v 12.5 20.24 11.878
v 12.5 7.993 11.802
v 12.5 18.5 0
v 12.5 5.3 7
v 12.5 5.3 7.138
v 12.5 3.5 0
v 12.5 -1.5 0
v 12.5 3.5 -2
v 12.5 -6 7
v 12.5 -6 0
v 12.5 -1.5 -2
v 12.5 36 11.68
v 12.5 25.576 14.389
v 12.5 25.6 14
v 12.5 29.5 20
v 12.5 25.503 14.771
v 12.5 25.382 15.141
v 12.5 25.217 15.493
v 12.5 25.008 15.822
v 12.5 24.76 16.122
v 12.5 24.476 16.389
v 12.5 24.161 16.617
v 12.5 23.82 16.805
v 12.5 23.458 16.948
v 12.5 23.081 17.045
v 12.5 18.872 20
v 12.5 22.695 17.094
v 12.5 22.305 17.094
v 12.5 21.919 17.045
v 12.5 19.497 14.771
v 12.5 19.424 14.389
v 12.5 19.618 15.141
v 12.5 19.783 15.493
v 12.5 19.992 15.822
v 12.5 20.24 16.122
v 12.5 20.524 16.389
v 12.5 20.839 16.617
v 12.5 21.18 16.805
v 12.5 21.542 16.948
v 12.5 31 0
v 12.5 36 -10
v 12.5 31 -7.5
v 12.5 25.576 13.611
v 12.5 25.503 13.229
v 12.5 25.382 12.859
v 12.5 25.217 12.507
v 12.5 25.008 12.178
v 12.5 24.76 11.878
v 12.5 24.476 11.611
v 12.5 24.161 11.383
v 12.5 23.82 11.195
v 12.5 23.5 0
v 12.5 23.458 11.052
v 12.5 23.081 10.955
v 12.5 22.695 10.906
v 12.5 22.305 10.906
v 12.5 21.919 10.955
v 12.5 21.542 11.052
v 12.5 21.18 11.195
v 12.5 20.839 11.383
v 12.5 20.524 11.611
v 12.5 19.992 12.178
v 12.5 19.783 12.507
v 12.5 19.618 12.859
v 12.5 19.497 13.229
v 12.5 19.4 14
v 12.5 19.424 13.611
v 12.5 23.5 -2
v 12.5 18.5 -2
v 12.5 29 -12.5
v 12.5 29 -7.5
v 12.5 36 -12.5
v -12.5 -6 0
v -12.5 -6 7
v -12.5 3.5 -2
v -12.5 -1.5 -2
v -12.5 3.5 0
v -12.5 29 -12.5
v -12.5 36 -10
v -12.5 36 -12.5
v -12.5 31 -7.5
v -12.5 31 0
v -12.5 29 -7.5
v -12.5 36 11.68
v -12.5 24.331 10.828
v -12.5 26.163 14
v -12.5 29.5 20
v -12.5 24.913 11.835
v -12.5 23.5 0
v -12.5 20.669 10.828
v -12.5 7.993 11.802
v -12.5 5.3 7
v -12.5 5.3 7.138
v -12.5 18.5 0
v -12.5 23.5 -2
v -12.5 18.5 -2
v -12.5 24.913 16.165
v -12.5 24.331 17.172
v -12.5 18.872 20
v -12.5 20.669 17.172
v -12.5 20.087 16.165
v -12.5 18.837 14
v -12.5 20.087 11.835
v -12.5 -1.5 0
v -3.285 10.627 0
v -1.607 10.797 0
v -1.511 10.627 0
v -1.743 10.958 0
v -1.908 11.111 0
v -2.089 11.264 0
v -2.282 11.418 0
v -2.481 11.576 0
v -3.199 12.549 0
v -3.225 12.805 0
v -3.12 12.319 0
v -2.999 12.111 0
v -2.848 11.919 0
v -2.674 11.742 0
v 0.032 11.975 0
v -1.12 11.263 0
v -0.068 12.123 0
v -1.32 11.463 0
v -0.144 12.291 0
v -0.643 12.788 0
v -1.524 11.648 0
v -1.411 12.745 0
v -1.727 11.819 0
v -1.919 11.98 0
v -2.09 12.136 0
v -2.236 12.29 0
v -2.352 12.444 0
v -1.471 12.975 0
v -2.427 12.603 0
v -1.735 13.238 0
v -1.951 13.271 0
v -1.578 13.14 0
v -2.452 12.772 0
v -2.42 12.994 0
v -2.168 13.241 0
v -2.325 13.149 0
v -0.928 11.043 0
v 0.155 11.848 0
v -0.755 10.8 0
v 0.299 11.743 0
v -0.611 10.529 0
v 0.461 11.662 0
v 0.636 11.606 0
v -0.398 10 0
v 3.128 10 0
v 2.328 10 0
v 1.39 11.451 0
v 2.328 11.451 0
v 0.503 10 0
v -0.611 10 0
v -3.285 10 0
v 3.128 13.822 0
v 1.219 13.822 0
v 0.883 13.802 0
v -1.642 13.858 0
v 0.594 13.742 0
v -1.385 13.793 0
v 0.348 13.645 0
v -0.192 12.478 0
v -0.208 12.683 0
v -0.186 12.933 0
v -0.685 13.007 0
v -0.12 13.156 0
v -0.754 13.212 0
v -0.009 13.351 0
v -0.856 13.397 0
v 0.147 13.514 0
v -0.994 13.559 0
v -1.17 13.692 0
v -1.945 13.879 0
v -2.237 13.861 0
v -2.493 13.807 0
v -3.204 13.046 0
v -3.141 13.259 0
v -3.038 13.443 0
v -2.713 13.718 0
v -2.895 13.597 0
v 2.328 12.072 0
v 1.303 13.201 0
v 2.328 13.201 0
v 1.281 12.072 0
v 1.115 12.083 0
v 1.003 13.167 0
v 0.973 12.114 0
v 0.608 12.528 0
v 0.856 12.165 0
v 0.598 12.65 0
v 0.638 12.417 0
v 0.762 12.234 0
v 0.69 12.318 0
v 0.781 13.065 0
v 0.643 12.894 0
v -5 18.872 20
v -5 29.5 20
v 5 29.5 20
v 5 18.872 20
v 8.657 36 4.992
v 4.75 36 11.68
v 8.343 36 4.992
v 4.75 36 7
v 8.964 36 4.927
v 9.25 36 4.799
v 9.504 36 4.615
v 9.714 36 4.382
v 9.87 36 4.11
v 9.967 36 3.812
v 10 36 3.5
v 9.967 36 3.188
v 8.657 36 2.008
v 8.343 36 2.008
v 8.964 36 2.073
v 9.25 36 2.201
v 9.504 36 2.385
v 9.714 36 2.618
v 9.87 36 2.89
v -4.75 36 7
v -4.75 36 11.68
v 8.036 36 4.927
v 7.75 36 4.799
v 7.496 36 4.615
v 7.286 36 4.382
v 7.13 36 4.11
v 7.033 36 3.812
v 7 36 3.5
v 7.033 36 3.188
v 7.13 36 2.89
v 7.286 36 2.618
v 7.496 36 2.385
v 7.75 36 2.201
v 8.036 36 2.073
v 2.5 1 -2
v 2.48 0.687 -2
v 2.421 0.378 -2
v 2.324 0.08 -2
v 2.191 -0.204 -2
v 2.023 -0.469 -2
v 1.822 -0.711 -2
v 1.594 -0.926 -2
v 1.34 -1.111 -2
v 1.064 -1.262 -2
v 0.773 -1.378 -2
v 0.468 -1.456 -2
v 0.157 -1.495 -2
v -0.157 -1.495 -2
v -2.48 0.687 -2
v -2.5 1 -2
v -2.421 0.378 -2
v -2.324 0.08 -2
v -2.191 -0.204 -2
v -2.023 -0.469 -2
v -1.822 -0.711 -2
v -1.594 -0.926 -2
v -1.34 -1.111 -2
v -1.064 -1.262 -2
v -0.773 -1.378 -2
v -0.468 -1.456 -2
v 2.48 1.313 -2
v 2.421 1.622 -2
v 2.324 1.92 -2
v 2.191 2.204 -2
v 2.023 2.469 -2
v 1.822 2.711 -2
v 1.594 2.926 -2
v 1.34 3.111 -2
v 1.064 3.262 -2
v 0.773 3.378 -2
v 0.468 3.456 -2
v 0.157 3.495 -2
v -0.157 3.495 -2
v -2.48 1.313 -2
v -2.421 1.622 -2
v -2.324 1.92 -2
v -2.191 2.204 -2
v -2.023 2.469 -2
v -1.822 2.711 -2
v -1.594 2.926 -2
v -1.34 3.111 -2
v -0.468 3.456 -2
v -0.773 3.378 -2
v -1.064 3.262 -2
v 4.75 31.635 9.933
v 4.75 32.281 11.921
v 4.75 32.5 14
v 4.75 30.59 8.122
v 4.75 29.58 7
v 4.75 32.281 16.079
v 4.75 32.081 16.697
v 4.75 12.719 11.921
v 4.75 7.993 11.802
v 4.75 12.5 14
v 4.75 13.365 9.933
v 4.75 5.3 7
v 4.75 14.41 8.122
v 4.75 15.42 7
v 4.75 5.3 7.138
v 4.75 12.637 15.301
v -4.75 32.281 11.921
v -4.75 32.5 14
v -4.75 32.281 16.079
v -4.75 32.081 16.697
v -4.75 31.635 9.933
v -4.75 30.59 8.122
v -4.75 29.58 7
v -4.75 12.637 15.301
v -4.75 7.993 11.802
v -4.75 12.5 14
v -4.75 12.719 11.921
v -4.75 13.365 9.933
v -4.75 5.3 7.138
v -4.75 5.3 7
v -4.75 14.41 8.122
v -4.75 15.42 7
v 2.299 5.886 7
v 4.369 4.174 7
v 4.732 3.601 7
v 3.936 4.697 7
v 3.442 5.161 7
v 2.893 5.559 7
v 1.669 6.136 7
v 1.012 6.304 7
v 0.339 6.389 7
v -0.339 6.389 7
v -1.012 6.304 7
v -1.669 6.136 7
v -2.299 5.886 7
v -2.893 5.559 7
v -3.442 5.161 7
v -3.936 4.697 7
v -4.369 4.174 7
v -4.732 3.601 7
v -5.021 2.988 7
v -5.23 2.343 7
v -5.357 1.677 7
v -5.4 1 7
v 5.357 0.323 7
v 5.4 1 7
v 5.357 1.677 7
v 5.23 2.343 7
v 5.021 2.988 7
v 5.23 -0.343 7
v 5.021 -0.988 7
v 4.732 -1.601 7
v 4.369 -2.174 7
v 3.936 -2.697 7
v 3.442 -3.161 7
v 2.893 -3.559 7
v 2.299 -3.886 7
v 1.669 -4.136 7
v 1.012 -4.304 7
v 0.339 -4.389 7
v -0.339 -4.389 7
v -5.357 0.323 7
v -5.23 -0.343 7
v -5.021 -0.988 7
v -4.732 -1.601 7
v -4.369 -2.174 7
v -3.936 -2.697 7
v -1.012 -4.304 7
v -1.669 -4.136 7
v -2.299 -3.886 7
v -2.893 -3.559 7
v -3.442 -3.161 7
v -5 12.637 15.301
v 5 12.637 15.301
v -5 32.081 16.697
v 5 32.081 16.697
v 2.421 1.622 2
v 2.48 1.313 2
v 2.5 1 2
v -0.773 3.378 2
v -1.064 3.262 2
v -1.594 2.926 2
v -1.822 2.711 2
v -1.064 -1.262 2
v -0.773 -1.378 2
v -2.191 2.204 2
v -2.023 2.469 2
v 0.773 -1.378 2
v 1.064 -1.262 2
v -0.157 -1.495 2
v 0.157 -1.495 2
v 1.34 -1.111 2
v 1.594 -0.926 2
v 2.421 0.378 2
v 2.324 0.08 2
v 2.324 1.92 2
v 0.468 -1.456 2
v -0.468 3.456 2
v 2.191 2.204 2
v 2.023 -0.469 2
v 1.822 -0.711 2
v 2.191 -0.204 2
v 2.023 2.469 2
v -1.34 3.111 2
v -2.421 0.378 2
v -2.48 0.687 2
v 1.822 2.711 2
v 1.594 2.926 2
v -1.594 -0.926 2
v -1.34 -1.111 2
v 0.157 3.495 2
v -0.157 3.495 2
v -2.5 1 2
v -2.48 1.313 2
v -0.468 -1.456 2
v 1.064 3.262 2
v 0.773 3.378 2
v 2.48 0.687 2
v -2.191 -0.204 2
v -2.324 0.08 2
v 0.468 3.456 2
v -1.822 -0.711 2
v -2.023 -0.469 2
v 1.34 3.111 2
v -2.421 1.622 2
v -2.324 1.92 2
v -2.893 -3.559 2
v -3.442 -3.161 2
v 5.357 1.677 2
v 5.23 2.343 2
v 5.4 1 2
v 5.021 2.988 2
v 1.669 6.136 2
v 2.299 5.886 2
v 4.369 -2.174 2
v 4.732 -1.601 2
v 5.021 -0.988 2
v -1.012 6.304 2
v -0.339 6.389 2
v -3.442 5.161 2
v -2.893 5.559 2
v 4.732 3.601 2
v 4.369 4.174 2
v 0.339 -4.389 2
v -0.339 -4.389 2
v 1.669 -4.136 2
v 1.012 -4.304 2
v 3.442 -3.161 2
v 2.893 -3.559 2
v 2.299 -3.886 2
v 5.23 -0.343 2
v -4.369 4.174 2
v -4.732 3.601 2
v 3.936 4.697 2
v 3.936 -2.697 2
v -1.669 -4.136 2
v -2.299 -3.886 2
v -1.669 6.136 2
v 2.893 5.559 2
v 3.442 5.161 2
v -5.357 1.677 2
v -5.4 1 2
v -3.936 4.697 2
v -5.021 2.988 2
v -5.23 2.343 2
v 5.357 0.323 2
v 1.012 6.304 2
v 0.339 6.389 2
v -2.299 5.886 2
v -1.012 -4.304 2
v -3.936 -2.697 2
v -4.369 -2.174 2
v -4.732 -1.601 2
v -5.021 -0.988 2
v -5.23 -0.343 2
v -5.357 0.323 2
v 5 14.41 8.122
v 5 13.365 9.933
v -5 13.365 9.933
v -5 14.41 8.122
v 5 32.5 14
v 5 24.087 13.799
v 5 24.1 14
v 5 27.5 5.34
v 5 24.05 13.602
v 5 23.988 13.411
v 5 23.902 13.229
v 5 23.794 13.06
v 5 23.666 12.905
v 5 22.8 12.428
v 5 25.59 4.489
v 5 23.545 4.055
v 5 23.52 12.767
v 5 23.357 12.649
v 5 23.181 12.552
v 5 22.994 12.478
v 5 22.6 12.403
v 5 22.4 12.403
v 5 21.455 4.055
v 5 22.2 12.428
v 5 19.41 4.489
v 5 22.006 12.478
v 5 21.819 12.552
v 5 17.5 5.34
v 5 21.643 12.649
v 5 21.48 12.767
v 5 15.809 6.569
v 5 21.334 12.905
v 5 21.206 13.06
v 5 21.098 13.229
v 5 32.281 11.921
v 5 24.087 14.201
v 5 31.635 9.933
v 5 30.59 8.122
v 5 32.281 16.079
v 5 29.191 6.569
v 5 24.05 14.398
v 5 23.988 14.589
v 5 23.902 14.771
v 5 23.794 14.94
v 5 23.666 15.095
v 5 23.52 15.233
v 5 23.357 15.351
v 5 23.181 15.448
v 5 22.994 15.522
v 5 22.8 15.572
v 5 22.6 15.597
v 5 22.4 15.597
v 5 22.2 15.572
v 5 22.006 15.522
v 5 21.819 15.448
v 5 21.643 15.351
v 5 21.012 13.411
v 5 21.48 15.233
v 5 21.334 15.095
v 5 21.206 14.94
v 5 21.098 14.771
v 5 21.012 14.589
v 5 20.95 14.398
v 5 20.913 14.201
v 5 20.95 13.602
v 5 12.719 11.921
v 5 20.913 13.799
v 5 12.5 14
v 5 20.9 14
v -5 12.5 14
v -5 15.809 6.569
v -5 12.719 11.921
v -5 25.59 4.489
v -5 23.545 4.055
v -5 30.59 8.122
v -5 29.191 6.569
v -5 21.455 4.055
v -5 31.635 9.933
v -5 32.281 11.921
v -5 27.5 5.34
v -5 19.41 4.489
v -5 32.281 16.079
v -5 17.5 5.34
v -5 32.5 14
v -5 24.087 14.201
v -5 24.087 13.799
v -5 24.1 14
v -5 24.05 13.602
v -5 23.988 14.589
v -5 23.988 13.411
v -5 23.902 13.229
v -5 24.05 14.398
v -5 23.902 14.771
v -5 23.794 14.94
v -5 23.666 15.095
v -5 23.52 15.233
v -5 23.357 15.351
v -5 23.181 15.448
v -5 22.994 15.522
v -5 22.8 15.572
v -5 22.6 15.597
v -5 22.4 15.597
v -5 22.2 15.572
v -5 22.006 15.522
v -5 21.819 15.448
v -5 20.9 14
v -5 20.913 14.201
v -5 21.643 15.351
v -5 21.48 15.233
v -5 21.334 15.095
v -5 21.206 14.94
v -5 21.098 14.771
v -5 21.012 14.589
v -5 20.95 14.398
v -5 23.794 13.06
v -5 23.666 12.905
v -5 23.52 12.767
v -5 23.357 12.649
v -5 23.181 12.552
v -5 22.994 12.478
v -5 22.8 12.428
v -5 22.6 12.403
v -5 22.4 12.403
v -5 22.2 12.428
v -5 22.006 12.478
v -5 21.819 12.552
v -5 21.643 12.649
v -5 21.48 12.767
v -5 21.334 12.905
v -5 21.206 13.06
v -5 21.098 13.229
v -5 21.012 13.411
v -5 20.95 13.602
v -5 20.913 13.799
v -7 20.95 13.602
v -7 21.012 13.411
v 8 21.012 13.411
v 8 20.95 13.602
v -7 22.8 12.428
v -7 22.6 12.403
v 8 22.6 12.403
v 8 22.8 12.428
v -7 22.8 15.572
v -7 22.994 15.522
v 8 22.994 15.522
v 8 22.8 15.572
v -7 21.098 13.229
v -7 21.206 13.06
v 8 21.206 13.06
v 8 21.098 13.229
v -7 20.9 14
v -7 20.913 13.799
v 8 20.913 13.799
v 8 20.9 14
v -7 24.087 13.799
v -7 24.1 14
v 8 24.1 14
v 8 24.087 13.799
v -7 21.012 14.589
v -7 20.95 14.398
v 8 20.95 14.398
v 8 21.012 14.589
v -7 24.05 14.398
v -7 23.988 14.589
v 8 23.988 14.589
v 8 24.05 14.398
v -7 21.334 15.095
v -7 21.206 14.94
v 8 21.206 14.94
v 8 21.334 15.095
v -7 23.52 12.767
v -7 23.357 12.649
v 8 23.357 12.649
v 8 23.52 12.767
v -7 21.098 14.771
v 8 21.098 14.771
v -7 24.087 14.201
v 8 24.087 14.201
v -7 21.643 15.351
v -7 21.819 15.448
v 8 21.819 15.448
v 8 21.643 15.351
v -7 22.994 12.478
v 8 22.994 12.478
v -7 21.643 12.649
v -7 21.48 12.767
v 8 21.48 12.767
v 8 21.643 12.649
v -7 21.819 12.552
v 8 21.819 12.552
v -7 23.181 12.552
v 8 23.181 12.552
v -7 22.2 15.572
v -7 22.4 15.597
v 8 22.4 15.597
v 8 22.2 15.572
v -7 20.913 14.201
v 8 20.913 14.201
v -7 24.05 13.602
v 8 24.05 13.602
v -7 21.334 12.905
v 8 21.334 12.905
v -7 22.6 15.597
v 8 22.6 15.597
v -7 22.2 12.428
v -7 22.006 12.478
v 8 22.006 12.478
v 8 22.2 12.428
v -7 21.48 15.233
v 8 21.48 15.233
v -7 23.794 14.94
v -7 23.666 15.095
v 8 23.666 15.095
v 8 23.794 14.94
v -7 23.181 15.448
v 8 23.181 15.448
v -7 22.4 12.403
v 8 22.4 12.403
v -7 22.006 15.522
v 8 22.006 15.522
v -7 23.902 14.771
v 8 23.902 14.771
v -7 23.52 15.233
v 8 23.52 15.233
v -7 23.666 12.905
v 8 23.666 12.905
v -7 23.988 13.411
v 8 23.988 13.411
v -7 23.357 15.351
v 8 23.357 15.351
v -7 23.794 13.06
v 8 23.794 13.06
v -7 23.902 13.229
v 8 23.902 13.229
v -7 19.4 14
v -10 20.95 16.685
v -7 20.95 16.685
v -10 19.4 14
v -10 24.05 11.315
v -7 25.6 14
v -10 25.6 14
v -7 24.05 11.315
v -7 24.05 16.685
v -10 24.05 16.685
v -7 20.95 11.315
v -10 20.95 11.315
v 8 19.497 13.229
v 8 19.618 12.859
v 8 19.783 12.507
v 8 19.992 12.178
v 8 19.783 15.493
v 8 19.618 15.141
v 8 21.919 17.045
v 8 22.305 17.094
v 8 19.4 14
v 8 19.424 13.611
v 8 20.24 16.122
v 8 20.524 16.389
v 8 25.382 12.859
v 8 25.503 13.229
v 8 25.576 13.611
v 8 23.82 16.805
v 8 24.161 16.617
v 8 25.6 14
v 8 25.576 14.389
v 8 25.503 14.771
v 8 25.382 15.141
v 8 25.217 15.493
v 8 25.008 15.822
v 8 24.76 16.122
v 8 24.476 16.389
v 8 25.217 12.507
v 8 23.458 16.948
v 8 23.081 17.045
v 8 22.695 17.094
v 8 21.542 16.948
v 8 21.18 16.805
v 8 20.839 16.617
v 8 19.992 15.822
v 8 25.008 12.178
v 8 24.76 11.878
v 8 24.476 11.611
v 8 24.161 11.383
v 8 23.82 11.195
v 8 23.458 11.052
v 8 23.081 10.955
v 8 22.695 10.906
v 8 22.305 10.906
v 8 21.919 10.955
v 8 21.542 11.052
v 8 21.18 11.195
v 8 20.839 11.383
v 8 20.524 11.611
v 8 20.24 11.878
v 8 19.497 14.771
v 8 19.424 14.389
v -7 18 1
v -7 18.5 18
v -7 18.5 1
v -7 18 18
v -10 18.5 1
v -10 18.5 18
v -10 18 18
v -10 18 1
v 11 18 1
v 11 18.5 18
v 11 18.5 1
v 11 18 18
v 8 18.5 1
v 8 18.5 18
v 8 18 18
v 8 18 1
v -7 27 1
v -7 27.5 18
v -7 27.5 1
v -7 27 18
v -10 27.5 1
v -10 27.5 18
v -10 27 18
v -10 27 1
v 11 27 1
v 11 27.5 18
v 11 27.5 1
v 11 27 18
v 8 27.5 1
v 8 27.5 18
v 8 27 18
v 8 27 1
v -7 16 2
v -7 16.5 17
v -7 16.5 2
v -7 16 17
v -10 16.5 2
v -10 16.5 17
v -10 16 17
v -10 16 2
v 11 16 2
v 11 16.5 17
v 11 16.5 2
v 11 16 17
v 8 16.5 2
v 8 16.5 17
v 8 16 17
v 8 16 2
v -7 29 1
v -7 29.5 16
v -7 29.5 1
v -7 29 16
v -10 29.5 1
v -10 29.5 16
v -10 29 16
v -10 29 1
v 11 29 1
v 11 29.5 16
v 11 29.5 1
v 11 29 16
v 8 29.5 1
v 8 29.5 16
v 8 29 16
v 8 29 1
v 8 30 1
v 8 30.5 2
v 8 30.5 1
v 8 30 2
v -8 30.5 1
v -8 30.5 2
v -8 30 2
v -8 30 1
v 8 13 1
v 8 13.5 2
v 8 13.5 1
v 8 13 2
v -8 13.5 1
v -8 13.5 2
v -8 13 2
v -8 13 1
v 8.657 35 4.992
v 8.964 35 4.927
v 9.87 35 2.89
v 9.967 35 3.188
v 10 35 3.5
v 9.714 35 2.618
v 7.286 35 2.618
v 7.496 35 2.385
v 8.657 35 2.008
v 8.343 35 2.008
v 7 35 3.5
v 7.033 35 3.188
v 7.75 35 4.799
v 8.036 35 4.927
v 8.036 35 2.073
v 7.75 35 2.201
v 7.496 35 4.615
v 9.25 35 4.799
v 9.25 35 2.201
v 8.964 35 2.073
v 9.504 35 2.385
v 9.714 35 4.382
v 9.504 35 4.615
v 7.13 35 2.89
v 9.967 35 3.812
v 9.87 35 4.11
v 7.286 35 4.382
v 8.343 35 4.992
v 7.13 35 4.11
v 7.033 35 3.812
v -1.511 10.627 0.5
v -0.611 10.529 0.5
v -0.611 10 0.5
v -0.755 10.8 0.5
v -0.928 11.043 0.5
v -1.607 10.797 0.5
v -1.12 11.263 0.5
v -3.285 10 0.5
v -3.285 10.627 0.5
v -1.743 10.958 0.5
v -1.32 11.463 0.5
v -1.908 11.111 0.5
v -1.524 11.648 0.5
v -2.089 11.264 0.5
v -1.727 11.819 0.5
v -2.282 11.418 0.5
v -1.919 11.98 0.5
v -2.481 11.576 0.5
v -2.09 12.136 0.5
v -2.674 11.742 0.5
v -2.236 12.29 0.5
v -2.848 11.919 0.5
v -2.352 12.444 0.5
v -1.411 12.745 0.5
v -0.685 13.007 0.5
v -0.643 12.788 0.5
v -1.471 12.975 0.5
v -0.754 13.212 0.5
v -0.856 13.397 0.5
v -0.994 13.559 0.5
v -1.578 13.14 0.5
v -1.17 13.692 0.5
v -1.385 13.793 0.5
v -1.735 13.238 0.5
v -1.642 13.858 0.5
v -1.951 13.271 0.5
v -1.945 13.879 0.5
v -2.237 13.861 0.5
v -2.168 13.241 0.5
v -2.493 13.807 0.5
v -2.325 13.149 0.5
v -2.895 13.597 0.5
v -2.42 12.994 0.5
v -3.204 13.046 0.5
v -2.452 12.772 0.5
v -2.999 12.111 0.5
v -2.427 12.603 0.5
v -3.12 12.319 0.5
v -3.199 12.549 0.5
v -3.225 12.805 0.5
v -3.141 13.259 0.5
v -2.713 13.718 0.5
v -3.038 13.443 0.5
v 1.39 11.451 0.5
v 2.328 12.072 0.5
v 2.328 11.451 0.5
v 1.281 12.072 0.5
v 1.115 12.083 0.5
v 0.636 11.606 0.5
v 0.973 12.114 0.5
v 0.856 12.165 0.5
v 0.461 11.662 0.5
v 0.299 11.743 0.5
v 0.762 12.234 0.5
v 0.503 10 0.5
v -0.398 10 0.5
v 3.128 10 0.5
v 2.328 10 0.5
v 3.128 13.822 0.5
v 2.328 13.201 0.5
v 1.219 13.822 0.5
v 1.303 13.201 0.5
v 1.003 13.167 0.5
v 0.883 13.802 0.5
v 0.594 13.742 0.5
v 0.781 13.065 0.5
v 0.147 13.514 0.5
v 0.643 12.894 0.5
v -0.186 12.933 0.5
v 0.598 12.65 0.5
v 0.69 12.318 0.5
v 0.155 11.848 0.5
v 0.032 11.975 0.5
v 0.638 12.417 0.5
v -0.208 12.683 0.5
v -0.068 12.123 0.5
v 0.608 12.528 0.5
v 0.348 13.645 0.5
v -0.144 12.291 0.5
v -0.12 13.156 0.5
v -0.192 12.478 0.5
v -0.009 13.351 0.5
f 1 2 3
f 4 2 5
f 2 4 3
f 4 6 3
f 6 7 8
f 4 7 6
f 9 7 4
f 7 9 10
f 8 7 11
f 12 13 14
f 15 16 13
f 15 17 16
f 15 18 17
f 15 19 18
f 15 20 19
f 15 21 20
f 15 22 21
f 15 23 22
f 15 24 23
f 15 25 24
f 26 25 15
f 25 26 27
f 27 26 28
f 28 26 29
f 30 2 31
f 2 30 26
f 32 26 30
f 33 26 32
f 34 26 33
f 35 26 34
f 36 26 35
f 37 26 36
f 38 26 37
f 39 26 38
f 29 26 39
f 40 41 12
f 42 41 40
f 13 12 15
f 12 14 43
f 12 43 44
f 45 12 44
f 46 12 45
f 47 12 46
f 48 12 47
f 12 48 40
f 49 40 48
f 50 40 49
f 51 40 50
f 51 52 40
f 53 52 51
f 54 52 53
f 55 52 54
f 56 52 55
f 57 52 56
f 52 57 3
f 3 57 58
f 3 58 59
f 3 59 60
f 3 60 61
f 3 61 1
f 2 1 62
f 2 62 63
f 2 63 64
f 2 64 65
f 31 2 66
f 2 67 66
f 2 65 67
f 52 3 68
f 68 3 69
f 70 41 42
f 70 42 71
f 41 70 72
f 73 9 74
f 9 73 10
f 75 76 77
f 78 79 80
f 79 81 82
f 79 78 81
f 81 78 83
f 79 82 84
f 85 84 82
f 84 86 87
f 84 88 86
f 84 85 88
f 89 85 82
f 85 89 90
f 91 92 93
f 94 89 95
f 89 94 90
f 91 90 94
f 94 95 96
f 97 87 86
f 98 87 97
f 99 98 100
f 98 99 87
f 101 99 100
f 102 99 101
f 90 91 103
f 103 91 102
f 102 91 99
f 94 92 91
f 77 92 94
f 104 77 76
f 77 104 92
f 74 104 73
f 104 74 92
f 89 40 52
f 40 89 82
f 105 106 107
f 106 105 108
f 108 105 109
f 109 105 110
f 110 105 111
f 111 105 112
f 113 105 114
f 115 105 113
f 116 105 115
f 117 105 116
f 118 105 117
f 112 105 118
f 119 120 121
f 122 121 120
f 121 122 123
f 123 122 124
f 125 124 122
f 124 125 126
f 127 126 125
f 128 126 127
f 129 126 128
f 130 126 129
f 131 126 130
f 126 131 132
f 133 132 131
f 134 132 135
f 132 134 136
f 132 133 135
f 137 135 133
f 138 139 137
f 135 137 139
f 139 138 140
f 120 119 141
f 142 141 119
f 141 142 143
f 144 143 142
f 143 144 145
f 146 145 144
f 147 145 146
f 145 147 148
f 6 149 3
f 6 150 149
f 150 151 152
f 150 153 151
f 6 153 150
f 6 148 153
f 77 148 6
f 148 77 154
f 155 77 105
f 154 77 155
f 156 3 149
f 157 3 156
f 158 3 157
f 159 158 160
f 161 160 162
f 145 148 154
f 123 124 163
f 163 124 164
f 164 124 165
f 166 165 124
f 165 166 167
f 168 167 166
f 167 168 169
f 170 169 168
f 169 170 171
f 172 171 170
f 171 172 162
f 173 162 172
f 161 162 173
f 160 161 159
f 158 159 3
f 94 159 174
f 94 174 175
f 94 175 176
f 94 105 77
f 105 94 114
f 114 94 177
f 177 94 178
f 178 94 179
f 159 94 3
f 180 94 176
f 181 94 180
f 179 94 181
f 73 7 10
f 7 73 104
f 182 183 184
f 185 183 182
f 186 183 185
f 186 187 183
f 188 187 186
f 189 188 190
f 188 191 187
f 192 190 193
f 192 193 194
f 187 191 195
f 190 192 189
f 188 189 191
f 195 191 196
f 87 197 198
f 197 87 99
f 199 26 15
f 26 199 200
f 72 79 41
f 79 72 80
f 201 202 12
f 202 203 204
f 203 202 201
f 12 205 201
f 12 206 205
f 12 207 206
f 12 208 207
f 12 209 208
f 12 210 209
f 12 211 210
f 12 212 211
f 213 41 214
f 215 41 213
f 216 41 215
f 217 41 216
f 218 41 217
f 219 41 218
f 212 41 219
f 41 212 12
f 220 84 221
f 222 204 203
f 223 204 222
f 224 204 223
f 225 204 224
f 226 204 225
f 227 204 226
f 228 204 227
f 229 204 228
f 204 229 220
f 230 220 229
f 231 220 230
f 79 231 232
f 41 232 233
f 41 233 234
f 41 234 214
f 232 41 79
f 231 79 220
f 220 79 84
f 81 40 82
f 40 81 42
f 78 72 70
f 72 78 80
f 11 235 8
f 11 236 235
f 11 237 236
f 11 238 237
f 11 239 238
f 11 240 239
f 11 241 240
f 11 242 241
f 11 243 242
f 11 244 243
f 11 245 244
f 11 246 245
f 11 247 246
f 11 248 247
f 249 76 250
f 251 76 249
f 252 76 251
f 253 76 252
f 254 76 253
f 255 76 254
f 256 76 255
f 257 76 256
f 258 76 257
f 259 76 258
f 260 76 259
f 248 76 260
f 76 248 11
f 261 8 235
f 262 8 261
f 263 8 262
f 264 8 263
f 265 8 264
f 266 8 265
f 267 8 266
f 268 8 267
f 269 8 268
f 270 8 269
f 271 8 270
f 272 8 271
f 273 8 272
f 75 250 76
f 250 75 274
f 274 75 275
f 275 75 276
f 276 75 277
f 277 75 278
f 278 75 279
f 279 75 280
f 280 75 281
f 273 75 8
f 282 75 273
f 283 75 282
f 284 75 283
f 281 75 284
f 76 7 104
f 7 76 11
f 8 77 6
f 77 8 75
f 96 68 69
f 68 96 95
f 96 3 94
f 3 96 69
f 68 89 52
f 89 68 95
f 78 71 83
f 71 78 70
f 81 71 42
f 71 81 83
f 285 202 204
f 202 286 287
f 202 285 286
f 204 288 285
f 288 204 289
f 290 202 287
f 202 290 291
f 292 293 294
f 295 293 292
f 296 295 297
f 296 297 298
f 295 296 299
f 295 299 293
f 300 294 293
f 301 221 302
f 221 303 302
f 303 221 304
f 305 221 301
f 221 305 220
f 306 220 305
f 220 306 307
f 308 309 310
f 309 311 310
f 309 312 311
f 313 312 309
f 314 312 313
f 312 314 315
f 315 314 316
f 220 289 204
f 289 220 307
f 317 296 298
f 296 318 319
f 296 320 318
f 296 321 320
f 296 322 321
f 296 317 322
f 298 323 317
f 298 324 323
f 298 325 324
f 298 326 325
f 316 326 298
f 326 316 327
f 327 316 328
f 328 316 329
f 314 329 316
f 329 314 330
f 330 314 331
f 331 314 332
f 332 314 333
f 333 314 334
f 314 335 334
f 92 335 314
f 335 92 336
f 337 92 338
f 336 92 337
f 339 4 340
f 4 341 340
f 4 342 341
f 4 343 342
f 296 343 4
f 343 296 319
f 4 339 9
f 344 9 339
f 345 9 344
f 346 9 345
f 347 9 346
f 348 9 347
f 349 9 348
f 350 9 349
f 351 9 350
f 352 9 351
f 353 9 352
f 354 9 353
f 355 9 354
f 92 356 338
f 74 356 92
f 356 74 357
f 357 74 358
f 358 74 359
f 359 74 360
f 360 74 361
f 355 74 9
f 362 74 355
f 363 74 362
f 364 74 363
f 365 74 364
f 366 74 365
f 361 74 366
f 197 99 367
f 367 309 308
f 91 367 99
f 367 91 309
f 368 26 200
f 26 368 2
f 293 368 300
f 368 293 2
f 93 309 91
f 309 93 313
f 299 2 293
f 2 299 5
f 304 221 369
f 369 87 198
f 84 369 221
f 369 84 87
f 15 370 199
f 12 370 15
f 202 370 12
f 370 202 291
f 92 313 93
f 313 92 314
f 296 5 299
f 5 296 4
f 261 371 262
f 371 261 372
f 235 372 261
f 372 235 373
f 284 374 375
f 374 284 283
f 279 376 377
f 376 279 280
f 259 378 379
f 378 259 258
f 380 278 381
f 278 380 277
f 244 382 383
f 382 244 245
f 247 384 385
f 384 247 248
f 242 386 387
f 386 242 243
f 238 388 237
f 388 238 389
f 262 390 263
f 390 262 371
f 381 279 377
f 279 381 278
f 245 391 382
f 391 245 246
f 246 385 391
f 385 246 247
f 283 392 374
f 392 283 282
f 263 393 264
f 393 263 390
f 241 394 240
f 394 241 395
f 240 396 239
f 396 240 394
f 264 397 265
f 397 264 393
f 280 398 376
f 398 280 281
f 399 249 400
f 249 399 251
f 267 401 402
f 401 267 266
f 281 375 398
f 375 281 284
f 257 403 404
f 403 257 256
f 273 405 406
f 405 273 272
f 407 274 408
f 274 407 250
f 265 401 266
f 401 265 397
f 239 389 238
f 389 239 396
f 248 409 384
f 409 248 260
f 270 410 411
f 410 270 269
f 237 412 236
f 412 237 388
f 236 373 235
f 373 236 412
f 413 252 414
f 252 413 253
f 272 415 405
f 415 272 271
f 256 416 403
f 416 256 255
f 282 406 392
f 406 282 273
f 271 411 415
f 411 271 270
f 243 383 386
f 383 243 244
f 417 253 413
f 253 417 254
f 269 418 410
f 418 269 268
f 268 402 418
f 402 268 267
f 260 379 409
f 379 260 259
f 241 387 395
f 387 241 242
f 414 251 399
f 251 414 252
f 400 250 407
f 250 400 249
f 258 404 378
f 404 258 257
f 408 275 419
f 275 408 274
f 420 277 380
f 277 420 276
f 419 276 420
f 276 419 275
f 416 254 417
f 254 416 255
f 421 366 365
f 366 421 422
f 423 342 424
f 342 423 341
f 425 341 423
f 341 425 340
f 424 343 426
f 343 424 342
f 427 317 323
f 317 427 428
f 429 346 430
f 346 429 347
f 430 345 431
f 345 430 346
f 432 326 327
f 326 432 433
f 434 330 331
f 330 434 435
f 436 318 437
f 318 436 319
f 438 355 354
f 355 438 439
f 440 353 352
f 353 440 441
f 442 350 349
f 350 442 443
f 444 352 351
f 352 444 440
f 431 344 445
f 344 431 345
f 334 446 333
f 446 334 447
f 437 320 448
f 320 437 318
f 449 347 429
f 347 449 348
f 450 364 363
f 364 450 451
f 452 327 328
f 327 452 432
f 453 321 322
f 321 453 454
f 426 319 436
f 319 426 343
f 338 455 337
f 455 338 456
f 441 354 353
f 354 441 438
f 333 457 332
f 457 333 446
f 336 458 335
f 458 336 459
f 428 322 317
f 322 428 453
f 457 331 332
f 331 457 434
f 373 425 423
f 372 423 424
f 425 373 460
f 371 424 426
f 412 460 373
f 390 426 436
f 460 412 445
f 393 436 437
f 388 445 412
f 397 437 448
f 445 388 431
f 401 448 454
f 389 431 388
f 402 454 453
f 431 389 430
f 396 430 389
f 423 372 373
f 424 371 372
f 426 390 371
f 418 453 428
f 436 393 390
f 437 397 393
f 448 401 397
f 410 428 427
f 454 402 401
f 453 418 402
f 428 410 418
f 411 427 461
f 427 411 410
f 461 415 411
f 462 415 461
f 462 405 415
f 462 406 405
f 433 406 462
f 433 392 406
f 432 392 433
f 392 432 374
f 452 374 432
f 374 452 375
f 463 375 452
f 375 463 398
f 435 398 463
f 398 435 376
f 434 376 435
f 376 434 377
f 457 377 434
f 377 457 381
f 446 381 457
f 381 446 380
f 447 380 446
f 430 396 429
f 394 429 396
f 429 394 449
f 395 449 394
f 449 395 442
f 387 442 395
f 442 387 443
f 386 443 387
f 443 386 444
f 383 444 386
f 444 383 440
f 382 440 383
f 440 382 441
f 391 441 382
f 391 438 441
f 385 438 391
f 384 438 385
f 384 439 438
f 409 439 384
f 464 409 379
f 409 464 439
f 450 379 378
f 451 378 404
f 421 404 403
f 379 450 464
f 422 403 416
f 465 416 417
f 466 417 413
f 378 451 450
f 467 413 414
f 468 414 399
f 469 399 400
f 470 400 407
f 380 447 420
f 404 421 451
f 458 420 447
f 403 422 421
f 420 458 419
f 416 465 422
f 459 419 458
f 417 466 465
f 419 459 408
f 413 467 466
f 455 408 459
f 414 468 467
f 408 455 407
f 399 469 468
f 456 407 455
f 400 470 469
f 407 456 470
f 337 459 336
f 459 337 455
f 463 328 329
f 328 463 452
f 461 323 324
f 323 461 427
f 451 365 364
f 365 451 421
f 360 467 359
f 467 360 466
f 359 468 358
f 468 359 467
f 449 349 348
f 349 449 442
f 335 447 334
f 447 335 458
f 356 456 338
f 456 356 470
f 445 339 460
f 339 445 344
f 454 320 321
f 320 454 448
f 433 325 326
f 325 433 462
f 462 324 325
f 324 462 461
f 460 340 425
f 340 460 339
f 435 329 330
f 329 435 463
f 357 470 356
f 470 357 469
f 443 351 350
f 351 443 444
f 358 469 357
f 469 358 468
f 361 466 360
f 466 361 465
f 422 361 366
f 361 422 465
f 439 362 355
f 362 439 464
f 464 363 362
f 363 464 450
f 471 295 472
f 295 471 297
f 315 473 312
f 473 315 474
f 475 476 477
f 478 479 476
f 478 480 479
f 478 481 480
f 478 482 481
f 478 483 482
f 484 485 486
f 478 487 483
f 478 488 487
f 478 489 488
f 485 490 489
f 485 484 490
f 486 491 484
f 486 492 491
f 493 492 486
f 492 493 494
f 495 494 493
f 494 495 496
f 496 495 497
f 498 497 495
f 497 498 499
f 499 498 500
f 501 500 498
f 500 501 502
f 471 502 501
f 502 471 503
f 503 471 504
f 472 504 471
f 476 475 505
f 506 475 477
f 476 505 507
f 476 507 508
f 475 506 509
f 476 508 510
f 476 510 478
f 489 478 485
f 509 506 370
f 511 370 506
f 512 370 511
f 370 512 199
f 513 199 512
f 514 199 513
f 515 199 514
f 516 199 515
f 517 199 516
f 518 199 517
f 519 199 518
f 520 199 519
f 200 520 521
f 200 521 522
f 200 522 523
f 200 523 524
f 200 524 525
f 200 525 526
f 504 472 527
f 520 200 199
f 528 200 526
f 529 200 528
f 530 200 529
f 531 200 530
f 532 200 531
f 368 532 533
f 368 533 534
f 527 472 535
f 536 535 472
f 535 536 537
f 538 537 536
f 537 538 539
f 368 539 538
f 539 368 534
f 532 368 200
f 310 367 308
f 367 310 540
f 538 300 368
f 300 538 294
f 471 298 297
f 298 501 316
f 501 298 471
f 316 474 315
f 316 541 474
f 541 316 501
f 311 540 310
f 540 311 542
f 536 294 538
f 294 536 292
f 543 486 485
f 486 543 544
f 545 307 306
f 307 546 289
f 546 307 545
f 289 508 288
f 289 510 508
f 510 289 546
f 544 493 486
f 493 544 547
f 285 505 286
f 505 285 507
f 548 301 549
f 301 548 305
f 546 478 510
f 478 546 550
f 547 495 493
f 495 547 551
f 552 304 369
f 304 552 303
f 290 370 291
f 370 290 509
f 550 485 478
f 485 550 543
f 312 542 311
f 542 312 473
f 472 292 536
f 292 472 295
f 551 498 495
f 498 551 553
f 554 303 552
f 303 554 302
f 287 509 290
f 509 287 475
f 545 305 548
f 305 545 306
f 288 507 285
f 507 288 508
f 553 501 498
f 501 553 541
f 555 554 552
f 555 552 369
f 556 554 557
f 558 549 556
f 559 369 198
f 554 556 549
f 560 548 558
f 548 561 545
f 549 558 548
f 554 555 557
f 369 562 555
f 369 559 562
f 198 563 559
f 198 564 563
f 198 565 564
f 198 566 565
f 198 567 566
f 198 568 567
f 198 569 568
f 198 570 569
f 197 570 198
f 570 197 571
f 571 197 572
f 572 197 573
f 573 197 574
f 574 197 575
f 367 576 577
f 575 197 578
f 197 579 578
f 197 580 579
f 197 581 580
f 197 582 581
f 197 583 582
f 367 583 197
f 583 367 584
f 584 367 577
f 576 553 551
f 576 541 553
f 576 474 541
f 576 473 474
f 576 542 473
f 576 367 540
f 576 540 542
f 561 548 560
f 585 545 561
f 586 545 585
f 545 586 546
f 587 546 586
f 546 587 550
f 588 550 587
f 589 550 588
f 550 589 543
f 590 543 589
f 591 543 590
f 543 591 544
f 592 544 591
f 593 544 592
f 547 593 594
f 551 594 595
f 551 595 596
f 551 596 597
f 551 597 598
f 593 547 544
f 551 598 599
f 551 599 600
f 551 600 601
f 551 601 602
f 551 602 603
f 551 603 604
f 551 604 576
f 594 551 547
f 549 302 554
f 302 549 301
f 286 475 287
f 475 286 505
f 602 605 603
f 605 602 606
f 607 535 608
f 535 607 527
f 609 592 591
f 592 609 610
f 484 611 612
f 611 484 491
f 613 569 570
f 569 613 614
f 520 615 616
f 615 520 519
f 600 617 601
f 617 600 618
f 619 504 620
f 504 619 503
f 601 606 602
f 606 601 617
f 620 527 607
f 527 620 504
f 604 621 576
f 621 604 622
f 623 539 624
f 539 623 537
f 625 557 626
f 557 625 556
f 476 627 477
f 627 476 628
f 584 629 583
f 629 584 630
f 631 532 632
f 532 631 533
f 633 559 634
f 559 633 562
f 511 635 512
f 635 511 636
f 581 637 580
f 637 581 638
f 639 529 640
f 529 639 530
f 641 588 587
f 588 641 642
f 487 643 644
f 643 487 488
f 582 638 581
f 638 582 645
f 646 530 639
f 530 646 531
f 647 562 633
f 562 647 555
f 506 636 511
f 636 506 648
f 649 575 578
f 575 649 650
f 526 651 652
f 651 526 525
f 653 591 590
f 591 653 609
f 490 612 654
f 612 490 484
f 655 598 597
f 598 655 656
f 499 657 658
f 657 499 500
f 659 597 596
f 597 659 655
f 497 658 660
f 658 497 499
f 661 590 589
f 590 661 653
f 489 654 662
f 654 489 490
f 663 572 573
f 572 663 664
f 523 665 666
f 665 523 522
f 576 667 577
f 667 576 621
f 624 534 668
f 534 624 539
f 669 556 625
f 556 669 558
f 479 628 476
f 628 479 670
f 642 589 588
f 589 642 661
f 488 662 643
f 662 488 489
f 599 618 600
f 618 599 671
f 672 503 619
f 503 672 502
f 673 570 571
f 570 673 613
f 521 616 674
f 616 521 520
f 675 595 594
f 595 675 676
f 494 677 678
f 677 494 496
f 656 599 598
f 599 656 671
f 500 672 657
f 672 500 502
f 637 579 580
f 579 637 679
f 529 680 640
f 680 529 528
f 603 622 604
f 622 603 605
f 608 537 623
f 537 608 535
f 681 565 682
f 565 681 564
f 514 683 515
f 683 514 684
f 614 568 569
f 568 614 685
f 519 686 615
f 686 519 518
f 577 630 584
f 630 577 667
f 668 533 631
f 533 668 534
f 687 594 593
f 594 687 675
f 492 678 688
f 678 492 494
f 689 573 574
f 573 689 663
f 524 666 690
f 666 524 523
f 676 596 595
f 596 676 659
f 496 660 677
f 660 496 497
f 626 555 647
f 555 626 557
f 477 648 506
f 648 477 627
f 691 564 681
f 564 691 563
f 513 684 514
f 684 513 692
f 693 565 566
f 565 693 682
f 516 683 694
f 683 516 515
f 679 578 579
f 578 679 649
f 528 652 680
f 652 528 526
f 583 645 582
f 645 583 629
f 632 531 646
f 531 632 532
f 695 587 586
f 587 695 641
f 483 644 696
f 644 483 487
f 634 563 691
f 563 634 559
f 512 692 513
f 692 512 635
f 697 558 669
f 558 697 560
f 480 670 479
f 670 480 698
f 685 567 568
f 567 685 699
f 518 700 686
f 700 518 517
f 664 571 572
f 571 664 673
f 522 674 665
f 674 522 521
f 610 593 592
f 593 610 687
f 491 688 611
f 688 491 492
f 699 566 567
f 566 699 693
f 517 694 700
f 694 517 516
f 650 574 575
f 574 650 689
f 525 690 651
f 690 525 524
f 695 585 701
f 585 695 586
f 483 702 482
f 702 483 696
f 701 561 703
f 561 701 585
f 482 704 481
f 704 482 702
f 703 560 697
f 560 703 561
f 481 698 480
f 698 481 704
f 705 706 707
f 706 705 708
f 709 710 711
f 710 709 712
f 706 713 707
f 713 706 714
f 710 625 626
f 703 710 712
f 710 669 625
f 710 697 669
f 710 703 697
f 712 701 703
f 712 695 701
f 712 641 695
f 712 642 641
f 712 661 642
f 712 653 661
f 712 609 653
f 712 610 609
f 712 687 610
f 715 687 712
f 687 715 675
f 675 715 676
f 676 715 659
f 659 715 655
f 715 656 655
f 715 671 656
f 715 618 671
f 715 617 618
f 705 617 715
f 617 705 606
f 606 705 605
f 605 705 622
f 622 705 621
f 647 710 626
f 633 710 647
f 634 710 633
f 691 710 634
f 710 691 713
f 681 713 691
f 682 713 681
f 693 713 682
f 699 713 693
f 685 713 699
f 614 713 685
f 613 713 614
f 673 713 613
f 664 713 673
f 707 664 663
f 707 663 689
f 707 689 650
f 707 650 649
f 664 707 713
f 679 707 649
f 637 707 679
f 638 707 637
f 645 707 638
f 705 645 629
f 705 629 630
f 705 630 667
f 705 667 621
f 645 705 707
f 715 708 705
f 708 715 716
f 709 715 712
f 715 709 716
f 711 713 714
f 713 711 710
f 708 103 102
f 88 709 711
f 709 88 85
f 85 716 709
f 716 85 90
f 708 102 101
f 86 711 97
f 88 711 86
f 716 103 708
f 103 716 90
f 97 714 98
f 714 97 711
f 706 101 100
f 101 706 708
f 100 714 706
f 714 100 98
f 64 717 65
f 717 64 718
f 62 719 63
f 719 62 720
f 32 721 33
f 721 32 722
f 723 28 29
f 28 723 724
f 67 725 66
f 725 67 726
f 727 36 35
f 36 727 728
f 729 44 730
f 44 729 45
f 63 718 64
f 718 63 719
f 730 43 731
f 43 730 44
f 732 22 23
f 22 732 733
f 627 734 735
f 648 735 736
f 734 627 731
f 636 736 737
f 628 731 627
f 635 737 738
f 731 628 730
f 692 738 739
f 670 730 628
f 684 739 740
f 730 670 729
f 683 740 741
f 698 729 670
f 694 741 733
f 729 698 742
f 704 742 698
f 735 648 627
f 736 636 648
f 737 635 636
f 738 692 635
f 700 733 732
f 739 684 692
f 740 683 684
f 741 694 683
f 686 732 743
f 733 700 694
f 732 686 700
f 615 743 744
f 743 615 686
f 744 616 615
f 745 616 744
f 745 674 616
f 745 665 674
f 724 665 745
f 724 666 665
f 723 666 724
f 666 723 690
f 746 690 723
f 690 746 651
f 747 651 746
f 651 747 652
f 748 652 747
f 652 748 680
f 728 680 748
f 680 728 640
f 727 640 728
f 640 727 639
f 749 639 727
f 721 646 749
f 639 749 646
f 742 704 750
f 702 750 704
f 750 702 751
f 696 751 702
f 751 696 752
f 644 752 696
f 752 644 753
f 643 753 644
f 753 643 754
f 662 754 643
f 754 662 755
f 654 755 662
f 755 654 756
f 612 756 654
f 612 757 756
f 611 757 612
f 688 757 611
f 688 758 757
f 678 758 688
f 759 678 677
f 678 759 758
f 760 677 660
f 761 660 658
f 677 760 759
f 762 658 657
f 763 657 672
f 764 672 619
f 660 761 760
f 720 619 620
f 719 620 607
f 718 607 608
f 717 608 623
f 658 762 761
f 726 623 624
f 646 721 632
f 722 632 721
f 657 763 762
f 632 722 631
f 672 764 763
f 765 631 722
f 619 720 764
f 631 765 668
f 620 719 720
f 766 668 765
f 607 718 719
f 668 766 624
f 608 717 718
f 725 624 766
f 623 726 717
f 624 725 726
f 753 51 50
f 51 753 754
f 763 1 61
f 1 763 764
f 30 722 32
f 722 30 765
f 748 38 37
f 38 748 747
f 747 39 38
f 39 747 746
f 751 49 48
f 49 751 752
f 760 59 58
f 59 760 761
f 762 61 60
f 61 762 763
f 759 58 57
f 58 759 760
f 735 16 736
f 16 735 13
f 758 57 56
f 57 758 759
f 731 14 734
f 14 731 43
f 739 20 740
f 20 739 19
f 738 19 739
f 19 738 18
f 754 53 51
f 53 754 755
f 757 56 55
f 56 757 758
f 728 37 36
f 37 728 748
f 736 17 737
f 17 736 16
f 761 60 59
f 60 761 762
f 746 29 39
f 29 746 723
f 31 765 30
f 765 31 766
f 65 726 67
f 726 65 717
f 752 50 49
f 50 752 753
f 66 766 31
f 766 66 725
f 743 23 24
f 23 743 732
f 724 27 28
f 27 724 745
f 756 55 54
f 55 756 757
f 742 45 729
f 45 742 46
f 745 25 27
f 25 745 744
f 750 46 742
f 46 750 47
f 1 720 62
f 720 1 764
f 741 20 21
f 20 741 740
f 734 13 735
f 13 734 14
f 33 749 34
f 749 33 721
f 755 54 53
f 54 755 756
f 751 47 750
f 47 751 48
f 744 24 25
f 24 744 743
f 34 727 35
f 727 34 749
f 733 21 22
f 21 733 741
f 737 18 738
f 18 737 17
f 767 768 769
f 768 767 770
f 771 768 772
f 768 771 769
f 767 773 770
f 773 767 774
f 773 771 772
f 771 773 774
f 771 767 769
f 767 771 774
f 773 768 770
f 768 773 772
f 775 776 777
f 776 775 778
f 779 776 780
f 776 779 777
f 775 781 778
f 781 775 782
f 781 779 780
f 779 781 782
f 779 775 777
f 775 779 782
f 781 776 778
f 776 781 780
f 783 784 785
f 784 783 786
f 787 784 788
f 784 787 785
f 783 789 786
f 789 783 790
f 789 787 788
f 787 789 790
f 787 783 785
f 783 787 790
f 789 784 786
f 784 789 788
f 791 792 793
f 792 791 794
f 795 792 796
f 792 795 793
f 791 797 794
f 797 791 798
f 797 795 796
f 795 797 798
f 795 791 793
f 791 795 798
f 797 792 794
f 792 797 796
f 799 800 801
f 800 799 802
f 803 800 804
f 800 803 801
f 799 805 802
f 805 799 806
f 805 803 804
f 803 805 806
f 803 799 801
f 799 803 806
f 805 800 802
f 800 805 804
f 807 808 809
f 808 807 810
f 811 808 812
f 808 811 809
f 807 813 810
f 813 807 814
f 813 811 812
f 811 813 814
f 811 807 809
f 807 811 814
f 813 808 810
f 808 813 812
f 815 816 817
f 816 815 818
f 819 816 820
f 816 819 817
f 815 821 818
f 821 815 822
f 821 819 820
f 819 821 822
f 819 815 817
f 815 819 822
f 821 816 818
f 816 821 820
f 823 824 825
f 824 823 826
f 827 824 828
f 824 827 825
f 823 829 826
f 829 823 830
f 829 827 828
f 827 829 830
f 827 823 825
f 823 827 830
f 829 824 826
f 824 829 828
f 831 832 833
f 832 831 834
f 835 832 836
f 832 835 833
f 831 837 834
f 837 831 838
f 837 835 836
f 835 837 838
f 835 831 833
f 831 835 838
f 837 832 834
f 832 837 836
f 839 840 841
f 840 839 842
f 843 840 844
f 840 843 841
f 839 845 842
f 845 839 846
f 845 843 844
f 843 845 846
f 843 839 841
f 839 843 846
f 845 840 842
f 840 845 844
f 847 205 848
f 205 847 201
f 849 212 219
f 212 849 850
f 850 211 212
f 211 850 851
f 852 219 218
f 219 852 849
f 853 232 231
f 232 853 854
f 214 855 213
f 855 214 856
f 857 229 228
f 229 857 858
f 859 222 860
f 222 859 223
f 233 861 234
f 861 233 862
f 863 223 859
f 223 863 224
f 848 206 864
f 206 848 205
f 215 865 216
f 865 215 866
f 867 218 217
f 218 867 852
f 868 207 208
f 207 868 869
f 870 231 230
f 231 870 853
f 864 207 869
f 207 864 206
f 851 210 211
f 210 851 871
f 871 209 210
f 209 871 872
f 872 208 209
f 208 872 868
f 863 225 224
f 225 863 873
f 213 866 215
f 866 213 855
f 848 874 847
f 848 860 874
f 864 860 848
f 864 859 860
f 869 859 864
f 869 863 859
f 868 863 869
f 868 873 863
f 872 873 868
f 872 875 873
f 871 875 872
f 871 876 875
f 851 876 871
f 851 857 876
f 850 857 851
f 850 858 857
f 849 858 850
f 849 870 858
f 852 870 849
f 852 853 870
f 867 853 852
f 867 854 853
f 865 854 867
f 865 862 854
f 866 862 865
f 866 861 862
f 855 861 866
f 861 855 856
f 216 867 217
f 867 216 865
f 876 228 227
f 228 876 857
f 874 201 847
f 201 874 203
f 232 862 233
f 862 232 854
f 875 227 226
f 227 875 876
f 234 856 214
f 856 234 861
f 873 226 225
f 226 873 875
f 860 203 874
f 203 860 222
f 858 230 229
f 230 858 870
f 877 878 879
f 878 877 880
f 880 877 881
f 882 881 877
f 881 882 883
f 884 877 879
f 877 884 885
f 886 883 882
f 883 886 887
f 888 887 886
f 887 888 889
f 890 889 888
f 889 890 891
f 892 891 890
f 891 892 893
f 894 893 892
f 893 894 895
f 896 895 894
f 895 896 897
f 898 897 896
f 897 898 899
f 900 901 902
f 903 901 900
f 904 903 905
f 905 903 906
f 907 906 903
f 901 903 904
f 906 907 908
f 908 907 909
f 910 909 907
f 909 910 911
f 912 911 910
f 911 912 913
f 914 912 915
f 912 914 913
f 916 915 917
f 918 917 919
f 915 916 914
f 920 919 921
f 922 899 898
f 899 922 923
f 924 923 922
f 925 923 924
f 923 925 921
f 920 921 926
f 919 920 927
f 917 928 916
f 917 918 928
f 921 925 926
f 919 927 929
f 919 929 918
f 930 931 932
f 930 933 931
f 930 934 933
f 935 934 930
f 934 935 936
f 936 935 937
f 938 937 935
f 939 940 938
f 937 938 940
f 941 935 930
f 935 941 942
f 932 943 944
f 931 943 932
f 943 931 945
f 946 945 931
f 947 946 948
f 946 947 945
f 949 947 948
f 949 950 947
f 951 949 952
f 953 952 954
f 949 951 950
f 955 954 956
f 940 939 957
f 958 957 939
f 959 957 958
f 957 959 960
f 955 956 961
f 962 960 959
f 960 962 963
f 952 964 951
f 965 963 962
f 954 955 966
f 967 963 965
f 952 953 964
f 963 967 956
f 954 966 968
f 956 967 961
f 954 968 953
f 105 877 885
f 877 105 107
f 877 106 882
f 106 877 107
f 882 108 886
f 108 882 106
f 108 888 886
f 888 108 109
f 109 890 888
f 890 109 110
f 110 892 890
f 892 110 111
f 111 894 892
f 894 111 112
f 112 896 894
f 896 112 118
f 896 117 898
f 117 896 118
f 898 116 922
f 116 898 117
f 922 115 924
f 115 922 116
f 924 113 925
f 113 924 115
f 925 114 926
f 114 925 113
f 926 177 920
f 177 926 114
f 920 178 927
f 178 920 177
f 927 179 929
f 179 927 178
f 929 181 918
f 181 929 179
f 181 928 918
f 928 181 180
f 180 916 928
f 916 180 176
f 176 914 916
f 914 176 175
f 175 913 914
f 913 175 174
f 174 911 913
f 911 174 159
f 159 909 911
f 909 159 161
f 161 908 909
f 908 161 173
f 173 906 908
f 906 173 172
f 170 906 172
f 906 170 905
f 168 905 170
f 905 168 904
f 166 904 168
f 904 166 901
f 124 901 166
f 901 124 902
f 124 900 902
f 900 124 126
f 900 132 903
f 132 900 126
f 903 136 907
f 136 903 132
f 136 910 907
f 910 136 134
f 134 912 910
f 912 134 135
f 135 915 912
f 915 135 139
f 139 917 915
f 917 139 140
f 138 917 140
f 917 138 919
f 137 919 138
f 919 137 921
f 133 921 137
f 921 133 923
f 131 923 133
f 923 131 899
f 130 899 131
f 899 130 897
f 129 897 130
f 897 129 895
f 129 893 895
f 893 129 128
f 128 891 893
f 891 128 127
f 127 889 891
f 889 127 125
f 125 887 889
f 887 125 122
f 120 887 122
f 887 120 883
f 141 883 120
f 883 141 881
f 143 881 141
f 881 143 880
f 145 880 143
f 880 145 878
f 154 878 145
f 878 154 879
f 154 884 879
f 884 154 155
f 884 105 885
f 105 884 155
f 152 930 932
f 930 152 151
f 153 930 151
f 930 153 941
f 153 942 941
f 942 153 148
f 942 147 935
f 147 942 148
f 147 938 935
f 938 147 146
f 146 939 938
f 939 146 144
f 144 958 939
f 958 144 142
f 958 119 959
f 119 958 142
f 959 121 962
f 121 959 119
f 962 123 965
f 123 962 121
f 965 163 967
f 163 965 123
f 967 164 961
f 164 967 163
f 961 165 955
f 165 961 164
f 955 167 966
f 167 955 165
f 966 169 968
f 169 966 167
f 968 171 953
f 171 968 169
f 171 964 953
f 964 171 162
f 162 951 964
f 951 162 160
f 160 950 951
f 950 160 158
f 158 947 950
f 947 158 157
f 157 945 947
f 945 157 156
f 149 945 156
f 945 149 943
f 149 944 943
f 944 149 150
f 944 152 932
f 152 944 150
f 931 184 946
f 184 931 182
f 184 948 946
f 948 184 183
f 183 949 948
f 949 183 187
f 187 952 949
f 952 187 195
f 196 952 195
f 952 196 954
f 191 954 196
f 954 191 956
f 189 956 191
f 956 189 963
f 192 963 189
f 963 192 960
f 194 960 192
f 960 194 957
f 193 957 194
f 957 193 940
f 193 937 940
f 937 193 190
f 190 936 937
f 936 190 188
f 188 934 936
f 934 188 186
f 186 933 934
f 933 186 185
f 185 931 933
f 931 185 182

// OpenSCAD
// PRUSA iteration4
// Y belt idler
// GNU GPL v3
// Josef Průša <iam@josefprusa.cz> and contributors
// http://www.reprap.org/wiki/Prusa_Mendel
// http://prusamendel.org

module Y_belt_idler()
{
    difference()
    { 
        // base block
        union(){
        translate([-12.5,-20,-6]) cube([25,20,46]);
        translate([-12.5,0,31]) cube([25,12.5,5]); //2040
        translate([-12.5,2,-1.5]) rotate ([90,0,0])cube([25,5,2]); //2040
        translate([-12.5,2,18.5]) rotate ([90,0,0])cube([25,5,2]); //2040
        translate([-12.5,7.5,29]) cube([25,5,2]); //2040
        //translate([-12.5,3,28]) cube([25,14,1]); //2040
        //translate([-12.5,3,27]) cube([25,14,1]); //2040
        }
        
        translate([-4.75,-27,-8]) cube([9.5,20,50]);
        translate([-13.5,-15,36]) cube([27,25,5]); //2040
        
        // angled front side   
        //translate([-15,-19.5,-15]) rotate([37,0,0]) cube([30,20,40]); 
        translate([-15,-26.3,-6]) rotate([37,0,0]) cube([30,20,40]); 
        translate([-15,-17,-12.1]) rotate([60,0,0]) cube([30,20,40]); 
        //translate([-15,-12,-15]) rotate([60,0,0]) cube([30,20,40]); 
        translate([-15,-20,29.5]) rotate([38,0,0]) cube([30,20,20]); 
        translate([-15,-27,-14.7]) rotate([0,0,0]) cube([30,20,20]); 

        // screws
        //translate([0,1,36]) rotate([90,0,0]) cylinder( h=25, r=2.5, $fn=50 ); //2040
        //translate([0,-2,36]) rotate([90,0,0]) cylinder( h=6, r=5.4 , $fn=50 ); //2040
        translate([0,10,1]) rotate([90,0,0]) cylinder( h=25, r=2.5, $fn=50 ); //2040
        translate([0,-2,1]) rotate([90,0,0]) cylinder( h=6, r=5.4 , $fn=50 ); //2040
        
        // pulley cut
        translate([-5,-14,22.5]) rotate([0,90,0]) cylinder( h=10, r=10, $fn=30 ); 
           
        // pulley screw axis 
        translate([-13.5,-14,22.5]) rotate([0,90,0]) cylinder( h=30, r=1.6, $fn=50 ); 
        translate([-14,-14,22.5]) rotate([0,90,0]) cylinder( h=7, r=3.1, $fn=6 ); 
        translate([-14,-14,22.5]) rotate([0,90,0]) cylinder( h=4, r2=3.1, r1=4, $fn=6 ); 
        translate([8,-14,22.5]) rotate([0,90,0]) cylinder( h=6, r=3.1, $fn=50 ); 
        
        // selective infill
        translate([-10,-18,18]) cube([3,17,0.5]);
        translate([8,-18,18]) cube([3,17,0.5]);
        translate([-10,-18,27]) cube([3,17,0.5]);
        translate([8,-18,27]) cube([3,17,0.5]);
        translate([-10,-17,16]) cube([3,15,0.5]);
        translate([8,-17,16]) cube([3,15,0.5]);
        translate([-10,-16,29]) cube([3,15,0.5]);
        translate([8,-16,29]) cube([3,15,0.5]);
        translate([-8,-2,30]) cube([16,1,0.5]);
        translate([-8,-2,13]) cube([16,1,0.5]);
        
        // upper side mark
        translate([8.5,-3.5,35]) rotate([0,0,0]) cylinder( h=2, r=1.5, $fn=30 ); 
        
        //version   
        translate([3.5,-0.5,10]) rotate([90,0,180]) linear_extrude(height = 0.6) 
        { text("R2",font = "helvetica:style=Bold", size=4, center=true); }
    }
    
}   
    
rotate([-90,0,0]) Y_belt_idler(); 
